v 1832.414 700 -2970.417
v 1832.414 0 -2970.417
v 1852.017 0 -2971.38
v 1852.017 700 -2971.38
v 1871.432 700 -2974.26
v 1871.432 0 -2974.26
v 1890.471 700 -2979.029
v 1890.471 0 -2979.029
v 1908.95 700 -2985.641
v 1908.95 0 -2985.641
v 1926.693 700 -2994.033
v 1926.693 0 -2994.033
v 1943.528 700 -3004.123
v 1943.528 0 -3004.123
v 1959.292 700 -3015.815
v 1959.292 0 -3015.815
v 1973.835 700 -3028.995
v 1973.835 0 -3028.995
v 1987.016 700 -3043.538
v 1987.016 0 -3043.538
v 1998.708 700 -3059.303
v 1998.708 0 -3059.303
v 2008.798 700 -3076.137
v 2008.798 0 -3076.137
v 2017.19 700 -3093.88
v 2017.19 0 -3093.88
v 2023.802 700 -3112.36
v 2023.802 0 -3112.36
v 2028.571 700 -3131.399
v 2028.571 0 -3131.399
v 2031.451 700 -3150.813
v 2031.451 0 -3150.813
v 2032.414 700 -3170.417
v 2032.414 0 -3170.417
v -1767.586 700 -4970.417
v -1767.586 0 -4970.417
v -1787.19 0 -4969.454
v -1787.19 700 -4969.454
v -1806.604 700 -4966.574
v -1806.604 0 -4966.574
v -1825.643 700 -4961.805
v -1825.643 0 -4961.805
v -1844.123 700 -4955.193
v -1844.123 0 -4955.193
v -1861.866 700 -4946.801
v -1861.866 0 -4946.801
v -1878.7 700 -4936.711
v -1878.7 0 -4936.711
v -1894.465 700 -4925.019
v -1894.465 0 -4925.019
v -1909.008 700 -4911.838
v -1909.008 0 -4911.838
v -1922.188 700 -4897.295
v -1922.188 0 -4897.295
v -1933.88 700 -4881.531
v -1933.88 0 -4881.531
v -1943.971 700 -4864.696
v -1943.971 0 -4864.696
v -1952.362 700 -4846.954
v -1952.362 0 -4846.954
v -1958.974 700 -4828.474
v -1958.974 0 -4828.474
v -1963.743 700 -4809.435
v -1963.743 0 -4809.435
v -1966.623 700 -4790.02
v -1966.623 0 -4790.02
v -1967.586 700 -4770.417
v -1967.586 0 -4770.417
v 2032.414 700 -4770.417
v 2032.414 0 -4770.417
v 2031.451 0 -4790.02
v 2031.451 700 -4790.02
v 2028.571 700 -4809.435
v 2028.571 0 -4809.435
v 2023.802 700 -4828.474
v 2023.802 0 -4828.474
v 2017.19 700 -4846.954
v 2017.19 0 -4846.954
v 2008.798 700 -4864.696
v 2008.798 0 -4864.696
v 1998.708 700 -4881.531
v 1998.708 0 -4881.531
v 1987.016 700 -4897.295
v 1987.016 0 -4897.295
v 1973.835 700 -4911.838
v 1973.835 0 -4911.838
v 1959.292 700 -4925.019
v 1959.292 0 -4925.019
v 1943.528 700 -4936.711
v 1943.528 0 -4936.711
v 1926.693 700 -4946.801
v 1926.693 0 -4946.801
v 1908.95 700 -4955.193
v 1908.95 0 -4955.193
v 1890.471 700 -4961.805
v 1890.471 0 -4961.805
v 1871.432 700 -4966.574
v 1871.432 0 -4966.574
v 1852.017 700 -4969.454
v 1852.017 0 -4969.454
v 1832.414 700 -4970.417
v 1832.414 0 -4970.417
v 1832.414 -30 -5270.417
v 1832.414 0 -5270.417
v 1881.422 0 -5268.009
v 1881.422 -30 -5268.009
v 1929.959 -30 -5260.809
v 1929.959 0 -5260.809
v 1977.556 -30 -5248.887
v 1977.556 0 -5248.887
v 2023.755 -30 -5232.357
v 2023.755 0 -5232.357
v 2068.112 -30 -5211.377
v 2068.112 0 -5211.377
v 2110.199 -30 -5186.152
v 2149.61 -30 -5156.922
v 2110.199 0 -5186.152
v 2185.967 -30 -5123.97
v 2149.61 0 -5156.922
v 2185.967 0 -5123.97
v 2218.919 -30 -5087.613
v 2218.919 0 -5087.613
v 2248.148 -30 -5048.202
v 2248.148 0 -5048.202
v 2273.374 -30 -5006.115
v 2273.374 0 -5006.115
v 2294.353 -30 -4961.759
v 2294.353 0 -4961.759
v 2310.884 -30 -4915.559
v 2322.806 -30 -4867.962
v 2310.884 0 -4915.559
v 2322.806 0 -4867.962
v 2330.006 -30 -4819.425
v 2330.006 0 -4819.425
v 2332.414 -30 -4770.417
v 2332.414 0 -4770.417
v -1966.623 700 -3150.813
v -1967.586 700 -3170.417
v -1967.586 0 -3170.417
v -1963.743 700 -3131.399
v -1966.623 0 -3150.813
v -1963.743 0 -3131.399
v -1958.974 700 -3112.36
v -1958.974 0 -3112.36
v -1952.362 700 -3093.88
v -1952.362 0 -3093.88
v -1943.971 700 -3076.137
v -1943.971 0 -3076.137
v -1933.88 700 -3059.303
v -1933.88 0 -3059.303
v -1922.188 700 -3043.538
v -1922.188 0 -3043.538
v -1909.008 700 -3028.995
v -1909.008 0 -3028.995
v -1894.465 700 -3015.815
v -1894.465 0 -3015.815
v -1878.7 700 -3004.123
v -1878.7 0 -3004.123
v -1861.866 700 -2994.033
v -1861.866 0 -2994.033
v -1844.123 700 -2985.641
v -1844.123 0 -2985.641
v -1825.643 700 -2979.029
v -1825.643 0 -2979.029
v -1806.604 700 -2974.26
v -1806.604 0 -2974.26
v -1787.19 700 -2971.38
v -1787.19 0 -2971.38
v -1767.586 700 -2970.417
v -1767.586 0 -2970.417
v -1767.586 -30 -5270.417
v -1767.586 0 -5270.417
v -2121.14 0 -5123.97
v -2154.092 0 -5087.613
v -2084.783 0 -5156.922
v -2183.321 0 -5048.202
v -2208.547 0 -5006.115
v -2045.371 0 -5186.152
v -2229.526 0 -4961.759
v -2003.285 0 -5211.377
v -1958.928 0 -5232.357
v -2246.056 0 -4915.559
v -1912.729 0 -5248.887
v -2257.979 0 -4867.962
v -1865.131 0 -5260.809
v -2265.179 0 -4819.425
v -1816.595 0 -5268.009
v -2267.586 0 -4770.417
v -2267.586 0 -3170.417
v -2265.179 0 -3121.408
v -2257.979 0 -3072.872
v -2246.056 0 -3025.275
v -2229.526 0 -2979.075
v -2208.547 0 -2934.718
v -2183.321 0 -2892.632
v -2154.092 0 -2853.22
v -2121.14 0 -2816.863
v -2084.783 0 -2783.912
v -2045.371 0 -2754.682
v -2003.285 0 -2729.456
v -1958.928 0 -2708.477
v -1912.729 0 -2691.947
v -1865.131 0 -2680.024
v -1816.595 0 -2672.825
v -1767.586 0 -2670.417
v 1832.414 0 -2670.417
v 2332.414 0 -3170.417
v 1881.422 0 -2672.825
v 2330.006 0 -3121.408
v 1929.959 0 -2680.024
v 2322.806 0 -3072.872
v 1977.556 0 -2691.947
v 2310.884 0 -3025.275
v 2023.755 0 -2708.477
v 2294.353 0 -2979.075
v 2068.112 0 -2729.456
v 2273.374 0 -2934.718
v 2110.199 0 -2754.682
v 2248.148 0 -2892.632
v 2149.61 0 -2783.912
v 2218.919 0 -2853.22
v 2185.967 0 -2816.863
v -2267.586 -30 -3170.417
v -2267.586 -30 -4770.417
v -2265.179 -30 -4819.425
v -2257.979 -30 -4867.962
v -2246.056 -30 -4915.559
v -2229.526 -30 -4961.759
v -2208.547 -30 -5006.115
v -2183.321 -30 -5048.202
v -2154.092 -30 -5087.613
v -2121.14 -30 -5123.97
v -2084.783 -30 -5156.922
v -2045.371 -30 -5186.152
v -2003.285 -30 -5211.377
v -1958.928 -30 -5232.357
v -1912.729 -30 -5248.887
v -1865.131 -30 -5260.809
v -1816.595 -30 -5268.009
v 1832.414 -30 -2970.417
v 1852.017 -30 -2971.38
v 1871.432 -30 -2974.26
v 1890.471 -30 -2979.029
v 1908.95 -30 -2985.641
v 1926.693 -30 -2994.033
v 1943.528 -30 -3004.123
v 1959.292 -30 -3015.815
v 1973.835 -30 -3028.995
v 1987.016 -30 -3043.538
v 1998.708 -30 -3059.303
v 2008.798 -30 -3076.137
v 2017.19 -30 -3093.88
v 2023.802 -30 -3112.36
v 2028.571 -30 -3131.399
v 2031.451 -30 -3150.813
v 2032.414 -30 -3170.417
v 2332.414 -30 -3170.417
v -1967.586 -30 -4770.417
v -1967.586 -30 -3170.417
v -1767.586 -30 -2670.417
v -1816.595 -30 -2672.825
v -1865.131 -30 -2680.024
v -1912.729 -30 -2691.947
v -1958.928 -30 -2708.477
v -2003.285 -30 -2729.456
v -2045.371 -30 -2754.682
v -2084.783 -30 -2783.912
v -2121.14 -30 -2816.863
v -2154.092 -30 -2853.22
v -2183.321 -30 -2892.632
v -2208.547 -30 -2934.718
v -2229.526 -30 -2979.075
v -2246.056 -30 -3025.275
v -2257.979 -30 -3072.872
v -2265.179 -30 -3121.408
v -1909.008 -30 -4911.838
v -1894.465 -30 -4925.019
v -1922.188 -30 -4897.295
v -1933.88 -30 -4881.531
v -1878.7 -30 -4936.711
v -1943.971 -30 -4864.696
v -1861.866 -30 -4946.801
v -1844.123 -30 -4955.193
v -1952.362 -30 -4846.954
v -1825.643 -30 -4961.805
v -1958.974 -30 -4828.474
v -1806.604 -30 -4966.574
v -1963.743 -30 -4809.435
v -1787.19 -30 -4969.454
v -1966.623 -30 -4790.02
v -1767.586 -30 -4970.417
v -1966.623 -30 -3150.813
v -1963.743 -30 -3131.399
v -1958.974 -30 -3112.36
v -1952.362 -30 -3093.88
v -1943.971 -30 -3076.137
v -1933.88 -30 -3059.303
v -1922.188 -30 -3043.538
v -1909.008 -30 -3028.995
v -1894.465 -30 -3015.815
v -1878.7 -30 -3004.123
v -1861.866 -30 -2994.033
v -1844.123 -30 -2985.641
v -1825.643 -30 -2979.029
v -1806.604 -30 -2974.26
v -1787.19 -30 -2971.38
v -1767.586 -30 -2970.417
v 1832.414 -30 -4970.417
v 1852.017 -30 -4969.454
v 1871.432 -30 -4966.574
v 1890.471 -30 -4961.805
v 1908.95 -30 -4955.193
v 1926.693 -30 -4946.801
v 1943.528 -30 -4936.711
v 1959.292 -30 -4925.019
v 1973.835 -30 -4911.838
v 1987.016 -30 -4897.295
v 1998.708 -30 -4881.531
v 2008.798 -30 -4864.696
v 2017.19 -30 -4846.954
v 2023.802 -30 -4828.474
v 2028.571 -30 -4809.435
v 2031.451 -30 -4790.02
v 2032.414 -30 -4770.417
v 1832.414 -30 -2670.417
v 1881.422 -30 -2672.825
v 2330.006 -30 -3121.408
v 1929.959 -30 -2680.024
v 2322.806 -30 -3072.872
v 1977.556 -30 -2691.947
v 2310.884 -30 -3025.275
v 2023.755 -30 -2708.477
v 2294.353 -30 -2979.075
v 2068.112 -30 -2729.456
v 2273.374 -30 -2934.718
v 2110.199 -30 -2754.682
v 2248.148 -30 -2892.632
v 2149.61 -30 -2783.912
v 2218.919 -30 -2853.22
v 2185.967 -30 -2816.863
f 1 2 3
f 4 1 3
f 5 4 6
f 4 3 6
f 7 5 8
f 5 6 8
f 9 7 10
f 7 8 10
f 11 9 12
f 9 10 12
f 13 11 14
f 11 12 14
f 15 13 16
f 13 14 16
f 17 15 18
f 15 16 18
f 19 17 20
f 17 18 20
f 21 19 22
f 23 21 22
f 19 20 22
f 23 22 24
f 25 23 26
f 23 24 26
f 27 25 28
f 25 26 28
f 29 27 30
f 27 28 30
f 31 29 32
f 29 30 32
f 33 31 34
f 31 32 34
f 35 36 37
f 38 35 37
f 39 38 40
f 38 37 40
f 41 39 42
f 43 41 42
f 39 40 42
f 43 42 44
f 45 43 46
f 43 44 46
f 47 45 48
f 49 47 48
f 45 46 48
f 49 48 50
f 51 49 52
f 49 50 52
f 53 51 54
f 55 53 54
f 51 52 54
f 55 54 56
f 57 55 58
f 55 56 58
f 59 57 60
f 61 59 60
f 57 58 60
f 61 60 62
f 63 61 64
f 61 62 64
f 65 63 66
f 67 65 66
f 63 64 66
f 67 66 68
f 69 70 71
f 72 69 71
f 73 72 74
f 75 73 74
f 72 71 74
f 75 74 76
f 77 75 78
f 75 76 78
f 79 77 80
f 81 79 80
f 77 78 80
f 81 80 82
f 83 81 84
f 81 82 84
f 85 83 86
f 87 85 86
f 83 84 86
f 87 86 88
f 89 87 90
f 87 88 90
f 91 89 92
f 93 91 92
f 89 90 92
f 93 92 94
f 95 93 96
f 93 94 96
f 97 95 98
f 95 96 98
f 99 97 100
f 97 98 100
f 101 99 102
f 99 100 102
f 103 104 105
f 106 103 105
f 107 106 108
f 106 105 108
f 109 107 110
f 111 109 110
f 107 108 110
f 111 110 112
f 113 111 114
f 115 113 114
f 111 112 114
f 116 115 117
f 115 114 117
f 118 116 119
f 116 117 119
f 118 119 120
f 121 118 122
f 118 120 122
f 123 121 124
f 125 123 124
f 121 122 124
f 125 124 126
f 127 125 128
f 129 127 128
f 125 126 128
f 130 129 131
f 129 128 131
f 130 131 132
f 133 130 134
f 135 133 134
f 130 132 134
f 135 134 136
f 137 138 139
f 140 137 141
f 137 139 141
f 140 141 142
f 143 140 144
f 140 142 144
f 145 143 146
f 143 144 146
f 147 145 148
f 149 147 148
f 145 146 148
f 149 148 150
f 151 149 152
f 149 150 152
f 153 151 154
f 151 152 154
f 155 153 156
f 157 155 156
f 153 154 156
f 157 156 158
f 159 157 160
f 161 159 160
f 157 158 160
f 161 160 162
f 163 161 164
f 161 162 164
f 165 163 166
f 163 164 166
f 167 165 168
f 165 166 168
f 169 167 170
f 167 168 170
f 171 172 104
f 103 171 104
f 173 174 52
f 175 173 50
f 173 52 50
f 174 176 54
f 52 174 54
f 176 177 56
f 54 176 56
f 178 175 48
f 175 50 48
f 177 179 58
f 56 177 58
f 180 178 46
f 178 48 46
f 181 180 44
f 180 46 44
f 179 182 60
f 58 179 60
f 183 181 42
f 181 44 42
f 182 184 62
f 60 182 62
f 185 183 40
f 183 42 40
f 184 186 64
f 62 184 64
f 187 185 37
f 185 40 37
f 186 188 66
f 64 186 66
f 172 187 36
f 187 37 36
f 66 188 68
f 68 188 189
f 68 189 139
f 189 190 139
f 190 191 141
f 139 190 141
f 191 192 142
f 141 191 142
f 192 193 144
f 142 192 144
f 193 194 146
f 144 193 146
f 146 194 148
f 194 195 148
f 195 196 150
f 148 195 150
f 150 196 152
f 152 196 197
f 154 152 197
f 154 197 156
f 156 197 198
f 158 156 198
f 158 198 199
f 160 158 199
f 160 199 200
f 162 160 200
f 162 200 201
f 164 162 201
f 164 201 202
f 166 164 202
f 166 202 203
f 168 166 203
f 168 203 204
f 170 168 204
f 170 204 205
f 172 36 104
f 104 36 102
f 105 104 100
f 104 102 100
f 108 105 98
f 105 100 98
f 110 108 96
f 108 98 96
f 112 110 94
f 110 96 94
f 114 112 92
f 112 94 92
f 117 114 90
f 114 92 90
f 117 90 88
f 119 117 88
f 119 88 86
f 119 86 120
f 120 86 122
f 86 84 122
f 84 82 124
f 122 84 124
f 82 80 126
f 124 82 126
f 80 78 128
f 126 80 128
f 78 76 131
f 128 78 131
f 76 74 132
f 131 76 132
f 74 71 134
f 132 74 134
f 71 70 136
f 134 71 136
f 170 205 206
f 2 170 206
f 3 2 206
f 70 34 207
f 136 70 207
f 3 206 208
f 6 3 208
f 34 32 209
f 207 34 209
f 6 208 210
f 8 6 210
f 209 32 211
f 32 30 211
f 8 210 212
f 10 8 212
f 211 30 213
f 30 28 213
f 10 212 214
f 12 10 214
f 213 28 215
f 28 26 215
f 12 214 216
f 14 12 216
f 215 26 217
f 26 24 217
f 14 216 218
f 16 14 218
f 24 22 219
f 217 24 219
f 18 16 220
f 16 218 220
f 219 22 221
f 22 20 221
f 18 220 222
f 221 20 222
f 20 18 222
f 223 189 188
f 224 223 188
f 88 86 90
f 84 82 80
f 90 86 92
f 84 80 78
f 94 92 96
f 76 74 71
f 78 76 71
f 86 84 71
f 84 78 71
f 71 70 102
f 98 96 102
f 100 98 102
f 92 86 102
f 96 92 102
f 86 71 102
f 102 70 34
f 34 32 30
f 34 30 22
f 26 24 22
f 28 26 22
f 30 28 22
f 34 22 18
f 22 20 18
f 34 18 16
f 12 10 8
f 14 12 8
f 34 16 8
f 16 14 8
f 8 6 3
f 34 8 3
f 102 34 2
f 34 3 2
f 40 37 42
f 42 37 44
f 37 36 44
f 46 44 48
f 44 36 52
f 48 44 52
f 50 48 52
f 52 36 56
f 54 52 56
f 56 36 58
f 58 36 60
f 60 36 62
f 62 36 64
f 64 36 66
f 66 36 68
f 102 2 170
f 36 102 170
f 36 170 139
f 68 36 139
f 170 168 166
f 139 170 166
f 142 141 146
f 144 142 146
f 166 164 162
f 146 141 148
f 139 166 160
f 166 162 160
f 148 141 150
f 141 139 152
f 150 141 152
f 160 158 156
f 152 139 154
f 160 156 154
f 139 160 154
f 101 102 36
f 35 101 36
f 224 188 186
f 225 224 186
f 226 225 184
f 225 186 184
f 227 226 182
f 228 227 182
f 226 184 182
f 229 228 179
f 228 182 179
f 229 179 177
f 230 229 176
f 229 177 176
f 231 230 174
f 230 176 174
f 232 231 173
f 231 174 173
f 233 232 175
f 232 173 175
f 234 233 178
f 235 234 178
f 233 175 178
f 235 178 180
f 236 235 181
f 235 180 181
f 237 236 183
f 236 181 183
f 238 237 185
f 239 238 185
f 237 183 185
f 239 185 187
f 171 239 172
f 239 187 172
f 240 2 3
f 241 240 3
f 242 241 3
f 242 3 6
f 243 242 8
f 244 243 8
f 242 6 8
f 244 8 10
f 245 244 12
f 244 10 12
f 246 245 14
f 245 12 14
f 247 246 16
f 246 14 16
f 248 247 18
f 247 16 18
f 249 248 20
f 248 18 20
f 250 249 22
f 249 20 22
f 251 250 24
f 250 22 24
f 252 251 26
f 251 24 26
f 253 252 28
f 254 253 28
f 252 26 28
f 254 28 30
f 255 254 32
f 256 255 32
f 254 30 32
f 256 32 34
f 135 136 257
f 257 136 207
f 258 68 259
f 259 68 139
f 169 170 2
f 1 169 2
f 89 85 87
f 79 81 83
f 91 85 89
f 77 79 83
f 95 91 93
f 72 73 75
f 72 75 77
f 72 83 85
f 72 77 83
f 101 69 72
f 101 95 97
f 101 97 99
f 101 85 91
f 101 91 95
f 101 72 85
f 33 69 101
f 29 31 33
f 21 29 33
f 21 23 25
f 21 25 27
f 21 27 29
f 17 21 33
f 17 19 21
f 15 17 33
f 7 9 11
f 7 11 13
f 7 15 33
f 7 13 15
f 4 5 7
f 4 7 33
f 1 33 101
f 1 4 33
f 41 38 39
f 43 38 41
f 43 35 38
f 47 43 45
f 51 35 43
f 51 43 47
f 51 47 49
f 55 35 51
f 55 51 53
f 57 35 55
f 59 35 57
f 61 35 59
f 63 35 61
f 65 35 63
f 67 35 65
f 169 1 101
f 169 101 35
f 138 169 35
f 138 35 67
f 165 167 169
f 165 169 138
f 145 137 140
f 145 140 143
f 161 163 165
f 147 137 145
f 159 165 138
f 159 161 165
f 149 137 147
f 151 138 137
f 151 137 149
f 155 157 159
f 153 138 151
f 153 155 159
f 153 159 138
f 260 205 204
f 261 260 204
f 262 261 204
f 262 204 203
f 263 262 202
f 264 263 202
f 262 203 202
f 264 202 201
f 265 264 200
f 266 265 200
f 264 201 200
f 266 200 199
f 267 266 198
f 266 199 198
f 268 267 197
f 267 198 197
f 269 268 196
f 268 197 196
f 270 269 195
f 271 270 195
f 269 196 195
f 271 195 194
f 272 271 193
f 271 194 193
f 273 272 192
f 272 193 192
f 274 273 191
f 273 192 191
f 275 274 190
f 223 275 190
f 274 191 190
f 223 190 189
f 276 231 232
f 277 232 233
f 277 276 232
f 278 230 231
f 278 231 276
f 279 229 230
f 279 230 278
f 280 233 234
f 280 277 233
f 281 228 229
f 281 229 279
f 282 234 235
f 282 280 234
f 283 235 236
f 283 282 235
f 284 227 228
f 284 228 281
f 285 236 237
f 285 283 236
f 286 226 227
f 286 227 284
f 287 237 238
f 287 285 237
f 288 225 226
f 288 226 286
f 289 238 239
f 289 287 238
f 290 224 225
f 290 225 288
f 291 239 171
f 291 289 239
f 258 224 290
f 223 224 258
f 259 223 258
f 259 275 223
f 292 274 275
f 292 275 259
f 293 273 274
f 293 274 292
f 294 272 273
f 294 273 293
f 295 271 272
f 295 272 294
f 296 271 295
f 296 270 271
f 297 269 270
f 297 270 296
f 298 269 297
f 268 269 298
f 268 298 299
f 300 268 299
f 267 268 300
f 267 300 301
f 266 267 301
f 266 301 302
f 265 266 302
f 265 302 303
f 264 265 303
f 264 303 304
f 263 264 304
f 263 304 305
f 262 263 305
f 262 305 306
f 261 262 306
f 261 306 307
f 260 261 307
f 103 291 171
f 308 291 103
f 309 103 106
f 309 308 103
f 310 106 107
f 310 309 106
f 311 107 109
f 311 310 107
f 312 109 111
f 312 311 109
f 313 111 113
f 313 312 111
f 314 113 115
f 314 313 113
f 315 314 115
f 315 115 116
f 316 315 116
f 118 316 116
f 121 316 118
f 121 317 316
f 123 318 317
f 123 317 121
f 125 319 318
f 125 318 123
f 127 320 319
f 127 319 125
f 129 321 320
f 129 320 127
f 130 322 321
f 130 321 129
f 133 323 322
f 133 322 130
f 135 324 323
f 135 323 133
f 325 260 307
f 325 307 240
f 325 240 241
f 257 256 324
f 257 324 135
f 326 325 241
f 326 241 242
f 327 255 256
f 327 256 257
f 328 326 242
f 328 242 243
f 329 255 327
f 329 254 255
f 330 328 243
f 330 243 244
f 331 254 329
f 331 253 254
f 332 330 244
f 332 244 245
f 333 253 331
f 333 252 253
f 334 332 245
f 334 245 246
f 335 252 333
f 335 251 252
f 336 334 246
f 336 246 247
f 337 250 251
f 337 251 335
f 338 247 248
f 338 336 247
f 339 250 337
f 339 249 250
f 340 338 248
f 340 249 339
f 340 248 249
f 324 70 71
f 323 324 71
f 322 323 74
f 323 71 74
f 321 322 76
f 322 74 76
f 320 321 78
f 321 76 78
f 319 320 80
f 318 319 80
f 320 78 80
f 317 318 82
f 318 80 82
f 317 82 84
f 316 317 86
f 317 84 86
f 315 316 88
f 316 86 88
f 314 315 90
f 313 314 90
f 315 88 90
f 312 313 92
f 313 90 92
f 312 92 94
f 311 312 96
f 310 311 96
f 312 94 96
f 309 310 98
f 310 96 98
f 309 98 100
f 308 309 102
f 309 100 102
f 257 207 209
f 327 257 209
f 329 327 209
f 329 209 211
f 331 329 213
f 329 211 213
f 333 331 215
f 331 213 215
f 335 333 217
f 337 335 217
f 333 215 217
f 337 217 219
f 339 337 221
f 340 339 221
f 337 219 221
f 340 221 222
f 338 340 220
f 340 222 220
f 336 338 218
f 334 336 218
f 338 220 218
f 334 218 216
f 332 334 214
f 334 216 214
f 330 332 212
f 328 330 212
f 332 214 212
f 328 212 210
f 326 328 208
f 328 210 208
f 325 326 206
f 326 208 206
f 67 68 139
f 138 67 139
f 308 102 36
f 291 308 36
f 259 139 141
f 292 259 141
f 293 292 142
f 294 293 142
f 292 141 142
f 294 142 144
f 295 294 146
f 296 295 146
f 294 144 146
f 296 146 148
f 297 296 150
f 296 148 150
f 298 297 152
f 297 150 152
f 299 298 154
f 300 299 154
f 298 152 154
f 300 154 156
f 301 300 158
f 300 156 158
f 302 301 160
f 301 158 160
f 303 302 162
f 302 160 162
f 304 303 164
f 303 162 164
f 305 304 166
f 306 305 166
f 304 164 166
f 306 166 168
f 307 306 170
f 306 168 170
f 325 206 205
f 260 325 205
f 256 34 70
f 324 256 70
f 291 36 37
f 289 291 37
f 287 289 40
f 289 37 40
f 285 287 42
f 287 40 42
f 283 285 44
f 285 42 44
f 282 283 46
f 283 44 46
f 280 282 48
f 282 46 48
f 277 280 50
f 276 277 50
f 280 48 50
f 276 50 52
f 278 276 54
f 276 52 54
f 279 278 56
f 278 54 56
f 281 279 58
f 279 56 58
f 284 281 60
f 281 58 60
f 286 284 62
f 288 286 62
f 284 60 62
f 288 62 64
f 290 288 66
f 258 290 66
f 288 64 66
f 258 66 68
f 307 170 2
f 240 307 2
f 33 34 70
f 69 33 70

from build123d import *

# Parameters (mm, degrees)
F1_DEPTH = 30
F3_DEPTH = 700


with BuildPart() as f1:
    # F0 (on Front) → F1 (new body)
    with BuildSketch(Plane.XZ):
        with BuildLine():
            Line((1832.413676, -2670.416884), (-1767.586324, -2670.416884))
            ThreePointArc((-1767.586324, -2670.416884), (-2121.13968, -2816.86348), (-2267.586276, -3170.416836))
            Line((-2267.586276, -3170.416836), (-2267.586276, -4770.416836))
            ThreePointArc((-2267.586276, -4770.416836), (-2121.13968, -5123.970193), (-1767.586324, -5270.416789))
            Line((-1767.586324, -5270.416789), (1832.413676, -5270.416789))
            ThreePointArc((1832.413676, -5270.416789), (2185.967033, -5123.970193), (2332.413629, -4770.416836))
            Line((2332.413629, -4770.416836), (2332.413629, -3170.416836))
            ThreePointArc((2332.413629, -3170.416836), (2185.967033, -2816.86348), (1832.413676, -2670.416884))
        make_face()
        with BuildLine():
            Line((-1767.586324, -2970.416836), (1832.413676, -2970.416836))
            ThreePointArc((1832.413676, -2970.416836), (1973.835033, -3028.99548), (2032.413676, -3170.416836))
            Line((2032.413676, -3170.416836), (2032.413676, -4770.416836))
            ThreePointArc((2032.413676, -4770.416836), (1973.835033, -4911.838193), (1832.413676, -4970.416836))
            Line((1832.413676, -4970.416836), (-1767.586324, -4970.416836))
            ThreePointArc((-1767.586324, -4970.416836), (-1909.00768, -4911.838193), (-1967.586324, -4770.416836))
            Line((-1967.586324, -4770.416836), (-1967.586324, -3170.416836))
            ThreePointArc((-1967.586324, -3170.416836), (-1909.00768, -3028.99548), (-1767.586324, -2970.416836))
        make_face(mode=Mode.SUBTRACT)
    extrude(amount=F1_DEPTH)


with BuildPart() as f3:
    # F2 (on face) → F3 (new body)
    with BuildSketch(Plane(origin=(0, 0, 0), x_dir=(-1, 0, 0), z_dir=(0, 1, 0))):
        with BuildLine():
            ThreePointArc((1967.586324, -3170.416836), (1909.00768, -3028.99548), (1767.586324, -2970.416836))
            Line((1767.586324, -2970.416836), (-1832.413676, -2970.416836))
            ThreePointArc((-1832.413676, -2970.416836), (-1973.835033, -3028.99548), (-2032.413676, -3170.416836))
            Line((-2032.413676, -3170.416836), (-2032.413676, -4770.416836))
            ThreePointArc((-2032.413676, -4770.416836), (-1973.835033, -4911.838193), (-1832.413676, -4970.416836))
            Line((-1832.413676, -4970.416836), (1767.586324, -4970.416836))
            ThreePointArc((1767.586324, -4970.416836), (1909.00768, -4911.838193), (1967.586324, -4770.416836))
            Line((1967.586324, -4770.416836), (1967.586324, -3170.416836))
        make_face()
    extrude(amount=F3_DEPTH)


solid = Compound([f1.part, f3.part])
